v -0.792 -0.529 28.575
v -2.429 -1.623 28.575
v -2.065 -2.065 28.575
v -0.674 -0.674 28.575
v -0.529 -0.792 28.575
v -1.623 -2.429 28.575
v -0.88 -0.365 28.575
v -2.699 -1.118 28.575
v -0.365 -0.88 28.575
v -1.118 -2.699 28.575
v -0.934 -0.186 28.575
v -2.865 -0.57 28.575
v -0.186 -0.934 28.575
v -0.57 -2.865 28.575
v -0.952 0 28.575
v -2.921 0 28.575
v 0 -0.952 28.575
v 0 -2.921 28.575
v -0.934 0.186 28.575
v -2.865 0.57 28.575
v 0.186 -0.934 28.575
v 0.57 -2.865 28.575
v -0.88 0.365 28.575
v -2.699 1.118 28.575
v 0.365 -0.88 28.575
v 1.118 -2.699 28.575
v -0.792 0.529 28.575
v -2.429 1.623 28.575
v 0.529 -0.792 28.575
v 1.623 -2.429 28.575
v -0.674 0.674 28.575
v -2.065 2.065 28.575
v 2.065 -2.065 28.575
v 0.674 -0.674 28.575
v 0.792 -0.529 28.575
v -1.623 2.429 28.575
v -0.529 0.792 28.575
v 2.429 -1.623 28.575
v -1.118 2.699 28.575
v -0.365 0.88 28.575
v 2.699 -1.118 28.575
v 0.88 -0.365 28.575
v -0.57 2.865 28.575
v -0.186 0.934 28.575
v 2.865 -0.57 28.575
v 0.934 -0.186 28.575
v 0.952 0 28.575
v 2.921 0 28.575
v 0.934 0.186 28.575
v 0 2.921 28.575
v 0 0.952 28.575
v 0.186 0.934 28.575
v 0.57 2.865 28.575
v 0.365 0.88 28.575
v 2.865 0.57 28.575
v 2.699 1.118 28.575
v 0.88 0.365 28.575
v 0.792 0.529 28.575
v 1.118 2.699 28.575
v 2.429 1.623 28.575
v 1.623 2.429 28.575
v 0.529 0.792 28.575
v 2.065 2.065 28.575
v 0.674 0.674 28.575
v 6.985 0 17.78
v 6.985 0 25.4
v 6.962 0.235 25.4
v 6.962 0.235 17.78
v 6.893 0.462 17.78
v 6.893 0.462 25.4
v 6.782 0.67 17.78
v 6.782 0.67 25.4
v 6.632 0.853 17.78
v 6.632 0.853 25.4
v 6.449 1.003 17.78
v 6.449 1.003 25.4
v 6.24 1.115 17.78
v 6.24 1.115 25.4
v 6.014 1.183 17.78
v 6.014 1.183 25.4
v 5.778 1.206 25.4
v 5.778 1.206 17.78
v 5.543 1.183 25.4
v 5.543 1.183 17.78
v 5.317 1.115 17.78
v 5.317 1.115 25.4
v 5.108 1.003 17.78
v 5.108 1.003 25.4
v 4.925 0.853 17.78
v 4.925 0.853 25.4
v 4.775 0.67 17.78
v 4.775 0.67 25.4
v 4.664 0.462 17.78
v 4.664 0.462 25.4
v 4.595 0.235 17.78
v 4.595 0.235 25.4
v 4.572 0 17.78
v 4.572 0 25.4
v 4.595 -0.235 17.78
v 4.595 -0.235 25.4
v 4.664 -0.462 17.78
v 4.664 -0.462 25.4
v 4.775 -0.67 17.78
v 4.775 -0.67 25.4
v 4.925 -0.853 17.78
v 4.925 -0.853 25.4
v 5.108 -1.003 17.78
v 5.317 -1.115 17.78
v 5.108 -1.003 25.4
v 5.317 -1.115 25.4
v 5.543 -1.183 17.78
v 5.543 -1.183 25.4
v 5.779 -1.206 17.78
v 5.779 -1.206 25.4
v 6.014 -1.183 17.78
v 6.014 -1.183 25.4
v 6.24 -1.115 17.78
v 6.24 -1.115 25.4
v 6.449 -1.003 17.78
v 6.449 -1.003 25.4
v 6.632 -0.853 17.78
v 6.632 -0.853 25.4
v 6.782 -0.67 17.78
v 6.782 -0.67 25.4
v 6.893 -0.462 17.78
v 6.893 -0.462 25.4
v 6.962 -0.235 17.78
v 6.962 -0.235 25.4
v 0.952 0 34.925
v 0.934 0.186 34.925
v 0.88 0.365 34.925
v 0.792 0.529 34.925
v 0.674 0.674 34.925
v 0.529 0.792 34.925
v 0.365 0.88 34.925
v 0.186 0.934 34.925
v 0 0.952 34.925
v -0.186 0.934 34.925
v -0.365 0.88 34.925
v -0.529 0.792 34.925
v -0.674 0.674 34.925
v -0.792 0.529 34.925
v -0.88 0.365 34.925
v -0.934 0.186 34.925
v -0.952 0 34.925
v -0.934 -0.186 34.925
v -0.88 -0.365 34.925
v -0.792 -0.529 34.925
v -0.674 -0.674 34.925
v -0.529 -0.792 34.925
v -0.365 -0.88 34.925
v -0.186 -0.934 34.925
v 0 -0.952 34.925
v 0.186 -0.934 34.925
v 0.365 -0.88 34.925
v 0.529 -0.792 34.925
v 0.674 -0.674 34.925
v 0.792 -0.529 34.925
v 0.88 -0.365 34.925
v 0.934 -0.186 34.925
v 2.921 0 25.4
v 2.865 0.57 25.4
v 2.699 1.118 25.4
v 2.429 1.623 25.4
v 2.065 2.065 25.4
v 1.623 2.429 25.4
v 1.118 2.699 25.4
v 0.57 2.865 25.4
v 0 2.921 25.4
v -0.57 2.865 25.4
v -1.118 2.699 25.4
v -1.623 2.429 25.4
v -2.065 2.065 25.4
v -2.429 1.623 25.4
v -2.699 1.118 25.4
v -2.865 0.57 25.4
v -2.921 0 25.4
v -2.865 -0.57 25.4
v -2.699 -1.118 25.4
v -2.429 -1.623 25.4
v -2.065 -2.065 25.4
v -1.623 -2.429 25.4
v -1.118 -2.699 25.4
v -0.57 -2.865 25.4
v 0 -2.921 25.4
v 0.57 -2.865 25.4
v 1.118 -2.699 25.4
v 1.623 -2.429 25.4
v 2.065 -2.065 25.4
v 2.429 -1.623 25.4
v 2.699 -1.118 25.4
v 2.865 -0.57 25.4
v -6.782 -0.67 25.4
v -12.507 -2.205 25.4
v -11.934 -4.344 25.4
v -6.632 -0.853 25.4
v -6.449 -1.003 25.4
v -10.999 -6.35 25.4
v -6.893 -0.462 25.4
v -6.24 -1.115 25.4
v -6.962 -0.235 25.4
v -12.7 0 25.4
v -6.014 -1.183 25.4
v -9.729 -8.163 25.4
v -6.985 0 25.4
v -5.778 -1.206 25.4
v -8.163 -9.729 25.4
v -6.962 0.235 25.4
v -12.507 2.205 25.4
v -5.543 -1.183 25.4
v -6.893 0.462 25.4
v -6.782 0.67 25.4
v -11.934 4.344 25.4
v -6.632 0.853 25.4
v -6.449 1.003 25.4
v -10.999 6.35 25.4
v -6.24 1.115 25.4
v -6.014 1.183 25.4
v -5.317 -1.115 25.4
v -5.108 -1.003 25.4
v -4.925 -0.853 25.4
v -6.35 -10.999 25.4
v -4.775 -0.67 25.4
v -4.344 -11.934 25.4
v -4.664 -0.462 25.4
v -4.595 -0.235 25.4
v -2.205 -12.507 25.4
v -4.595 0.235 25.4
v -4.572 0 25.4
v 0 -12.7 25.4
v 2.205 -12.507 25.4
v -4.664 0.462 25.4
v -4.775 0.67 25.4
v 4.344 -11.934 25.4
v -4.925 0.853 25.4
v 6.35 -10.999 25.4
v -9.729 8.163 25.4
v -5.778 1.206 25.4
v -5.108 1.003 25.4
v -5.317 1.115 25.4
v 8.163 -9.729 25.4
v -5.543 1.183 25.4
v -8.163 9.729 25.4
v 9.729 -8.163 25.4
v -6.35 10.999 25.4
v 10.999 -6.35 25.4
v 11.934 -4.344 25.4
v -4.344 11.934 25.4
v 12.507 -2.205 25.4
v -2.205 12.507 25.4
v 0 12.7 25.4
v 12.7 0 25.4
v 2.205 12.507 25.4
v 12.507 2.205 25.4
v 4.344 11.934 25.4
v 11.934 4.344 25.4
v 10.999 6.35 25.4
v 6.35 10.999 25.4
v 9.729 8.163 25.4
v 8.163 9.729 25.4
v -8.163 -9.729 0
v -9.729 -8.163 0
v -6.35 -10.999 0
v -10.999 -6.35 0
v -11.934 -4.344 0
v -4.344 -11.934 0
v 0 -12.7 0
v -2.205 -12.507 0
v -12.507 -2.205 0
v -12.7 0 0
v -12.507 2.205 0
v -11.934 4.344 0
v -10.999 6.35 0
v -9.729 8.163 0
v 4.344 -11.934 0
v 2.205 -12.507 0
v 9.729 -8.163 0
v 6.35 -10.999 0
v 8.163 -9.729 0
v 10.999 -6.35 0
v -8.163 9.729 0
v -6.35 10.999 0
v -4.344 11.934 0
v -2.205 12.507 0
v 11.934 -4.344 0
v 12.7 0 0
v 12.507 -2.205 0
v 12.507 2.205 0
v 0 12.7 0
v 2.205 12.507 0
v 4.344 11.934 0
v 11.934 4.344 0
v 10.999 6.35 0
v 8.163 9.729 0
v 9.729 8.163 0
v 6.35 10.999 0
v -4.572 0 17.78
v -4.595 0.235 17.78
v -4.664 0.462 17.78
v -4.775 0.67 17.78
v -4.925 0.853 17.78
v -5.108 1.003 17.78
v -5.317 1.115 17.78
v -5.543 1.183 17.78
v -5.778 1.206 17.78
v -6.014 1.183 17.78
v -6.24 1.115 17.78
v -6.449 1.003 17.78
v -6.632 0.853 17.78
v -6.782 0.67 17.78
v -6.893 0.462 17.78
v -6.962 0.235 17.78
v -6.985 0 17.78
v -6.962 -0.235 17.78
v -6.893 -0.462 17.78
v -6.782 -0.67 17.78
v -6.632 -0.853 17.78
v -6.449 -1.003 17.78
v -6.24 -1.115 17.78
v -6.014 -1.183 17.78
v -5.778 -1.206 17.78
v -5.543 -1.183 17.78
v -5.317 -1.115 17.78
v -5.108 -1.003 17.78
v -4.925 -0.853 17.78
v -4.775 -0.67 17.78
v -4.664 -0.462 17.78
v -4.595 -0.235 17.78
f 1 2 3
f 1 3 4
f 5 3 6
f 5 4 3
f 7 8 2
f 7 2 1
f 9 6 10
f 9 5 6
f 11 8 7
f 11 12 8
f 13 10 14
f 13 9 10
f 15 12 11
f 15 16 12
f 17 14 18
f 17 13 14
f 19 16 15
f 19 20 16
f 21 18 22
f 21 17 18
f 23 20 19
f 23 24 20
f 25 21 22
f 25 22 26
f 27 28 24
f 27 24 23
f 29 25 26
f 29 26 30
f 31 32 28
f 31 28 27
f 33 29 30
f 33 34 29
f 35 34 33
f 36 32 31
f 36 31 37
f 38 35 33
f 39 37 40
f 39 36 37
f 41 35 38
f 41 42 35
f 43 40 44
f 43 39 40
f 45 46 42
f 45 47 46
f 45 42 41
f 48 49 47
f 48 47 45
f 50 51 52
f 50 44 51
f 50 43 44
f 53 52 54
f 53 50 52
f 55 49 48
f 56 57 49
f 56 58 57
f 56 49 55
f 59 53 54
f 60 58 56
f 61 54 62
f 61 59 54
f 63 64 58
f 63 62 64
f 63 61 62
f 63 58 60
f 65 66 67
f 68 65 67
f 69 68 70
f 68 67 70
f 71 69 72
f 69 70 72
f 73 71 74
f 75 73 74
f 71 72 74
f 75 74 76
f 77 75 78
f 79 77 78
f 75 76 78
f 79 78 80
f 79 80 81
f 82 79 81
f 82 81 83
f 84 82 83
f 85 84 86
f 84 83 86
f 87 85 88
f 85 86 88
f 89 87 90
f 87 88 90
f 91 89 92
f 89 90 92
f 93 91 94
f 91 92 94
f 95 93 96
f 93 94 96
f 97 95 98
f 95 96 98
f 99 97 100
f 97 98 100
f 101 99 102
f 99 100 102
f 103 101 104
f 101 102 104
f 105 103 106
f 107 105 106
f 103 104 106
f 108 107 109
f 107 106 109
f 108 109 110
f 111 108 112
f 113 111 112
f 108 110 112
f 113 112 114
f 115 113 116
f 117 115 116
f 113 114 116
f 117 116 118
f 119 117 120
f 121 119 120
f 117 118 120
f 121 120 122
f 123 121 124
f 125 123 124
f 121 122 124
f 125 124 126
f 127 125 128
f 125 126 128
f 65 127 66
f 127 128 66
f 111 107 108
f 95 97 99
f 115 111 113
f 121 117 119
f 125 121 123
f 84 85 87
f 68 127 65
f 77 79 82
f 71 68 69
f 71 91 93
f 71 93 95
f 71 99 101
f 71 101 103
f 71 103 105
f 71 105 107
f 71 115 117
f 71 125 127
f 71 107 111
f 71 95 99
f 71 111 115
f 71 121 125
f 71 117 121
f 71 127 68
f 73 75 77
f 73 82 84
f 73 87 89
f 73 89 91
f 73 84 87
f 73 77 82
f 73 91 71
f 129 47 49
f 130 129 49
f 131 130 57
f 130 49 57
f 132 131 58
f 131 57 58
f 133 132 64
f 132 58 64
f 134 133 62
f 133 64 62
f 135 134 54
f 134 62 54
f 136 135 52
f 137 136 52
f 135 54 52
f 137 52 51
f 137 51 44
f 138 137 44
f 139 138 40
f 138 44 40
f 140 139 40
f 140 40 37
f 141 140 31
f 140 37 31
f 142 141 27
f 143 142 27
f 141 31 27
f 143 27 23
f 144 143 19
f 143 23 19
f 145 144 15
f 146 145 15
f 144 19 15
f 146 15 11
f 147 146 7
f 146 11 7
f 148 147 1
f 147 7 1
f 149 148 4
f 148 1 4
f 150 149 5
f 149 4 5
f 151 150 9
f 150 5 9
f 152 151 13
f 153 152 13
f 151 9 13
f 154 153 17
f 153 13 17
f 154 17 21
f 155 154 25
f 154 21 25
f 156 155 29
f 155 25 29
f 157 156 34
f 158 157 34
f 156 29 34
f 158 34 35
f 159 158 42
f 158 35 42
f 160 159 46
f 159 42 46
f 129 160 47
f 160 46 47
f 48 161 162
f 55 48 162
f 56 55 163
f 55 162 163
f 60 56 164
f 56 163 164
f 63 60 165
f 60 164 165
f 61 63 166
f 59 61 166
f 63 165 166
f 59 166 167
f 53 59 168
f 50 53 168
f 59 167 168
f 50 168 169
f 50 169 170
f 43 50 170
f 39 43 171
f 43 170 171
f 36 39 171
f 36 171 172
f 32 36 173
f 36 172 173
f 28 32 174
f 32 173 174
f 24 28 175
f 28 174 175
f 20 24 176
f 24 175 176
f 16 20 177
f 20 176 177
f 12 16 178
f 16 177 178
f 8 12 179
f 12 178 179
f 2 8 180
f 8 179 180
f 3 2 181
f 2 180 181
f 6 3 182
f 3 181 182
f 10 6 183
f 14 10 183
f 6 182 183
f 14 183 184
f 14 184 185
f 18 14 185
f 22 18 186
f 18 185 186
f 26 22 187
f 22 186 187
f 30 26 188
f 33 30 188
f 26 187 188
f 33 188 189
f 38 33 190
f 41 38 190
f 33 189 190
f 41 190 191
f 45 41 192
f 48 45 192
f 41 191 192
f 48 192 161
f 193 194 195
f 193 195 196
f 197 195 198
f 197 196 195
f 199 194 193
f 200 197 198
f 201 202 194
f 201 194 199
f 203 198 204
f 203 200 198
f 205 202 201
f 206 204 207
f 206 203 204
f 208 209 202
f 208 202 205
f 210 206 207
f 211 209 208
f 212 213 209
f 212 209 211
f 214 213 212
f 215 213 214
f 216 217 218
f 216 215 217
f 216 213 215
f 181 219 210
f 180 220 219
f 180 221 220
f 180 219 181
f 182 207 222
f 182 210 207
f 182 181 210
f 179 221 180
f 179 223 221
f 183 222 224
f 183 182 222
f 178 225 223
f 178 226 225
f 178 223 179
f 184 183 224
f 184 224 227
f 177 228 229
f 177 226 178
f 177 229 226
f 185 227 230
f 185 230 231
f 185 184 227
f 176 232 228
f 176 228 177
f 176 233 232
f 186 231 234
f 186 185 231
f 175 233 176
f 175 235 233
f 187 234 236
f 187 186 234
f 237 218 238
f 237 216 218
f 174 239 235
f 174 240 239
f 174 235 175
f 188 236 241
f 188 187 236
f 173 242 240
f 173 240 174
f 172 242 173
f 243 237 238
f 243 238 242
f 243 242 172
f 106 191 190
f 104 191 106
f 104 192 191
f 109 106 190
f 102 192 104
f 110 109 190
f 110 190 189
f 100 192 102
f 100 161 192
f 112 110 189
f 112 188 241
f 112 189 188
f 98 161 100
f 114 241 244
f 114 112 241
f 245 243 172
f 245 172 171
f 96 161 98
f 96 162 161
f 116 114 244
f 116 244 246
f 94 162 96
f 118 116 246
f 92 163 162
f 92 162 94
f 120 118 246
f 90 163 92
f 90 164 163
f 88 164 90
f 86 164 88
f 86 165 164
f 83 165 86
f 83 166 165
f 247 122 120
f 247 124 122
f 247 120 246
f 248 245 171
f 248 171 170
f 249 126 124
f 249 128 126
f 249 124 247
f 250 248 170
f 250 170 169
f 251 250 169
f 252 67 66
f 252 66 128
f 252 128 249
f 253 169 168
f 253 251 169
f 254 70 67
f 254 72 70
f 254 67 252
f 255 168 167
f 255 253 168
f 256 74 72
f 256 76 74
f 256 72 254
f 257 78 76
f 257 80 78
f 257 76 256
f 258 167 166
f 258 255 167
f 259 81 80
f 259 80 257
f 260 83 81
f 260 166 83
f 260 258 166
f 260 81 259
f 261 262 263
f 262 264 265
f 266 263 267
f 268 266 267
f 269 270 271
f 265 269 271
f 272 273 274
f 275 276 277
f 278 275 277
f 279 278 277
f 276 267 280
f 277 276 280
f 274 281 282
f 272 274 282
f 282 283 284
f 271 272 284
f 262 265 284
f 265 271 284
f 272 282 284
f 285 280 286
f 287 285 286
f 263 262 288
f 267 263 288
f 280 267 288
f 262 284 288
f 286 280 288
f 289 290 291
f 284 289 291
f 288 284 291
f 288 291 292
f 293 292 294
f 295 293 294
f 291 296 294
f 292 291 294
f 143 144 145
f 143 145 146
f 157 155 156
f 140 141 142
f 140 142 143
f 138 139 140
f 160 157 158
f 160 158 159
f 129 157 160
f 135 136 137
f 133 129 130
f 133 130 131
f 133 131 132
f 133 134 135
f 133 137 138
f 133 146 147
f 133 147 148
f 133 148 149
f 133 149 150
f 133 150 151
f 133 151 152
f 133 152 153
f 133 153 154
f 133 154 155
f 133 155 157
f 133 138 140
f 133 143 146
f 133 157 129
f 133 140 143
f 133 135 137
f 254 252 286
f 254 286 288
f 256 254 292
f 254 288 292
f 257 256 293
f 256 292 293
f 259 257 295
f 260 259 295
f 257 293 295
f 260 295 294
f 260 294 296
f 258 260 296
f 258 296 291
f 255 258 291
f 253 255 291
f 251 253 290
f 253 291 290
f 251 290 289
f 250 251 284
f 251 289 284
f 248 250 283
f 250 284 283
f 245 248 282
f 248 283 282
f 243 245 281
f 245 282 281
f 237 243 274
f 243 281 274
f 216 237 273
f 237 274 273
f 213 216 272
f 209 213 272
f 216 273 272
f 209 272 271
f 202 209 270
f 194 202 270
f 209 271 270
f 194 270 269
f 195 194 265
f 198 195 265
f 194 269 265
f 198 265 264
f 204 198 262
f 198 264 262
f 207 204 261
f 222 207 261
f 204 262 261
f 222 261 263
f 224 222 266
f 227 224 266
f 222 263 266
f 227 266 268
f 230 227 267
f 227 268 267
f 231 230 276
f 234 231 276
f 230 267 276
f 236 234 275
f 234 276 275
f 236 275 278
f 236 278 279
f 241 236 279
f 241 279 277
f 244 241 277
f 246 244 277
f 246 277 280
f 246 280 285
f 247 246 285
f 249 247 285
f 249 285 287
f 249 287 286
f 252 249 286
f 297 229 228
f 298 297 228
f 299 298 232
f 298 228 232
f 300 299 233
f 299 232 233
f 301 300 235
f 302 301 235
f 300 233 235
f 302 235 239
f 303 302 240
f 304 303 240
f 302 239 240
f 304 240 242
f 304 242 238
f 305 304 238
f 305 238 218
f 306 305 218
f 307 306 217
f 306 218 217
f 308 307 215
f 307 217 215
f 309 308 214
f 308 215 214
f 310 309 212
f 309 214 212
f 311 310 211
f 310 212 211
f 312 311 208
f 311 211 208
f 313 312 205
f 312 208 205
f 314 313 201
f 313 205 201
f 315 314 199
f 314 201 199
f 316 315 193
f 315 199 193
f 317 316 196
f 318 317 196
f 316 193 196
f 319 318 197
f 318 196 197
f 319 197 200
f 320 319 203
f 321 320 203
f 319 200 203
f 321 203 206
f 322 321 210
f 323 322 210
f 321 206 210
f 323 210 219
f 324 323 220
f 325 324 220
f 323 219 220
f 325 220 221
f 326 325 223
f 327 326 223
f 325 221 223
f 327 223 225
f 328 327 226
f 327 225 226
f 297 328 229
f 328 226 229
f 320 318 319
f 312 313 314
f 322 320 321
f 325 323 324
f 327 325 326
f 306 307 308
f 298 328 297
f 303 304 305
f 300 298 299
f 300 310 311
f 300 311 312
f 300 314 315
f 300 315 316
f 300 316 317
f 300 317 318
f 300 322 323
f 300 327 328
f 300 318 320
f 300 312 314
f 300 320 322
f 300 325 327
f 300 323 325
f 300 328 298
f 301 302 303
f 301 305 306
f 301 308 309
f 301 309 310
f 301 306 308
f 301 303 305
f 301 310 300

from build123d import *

# Parameters (mm, degrees)
SKETCH1_R           = 12.7
BOSS_EXTRUDE1_DEPTH = 25.4
SKETCH2_R           = 2.921
BOSS_EXTRUDE2_DEPTH = 3.175
SKETCH4_R           = 1.2065
CUT_EXTRUDE1_DEPTH  = 7.62
SKETCH6_R           = 0.9525
BOSS_EXTRUDE3_DEPTH = 6.35


with BuildPart() as part:
    # Sketch1 → Boss-Extrude1 (new body)
    with BuildSketch(Plane.XY):
        Circle(SKETCH1_R)
    extrude(amount=BOSS_EXTRUDE1_DEPTH)

    # Sketch2 → Boss-Extrude2 (add)
    with BuildSketch(Plane.XY.offset(25.4)):
        Circle(SKETCH2_R)
    extrude(amount=BOSS_EXTRUDE2_DEPTH)

    # Sketch4 → Cut-Extrude1 (cut)
    with BuildSketch(Plane.XY.offset(25.4)):
        with Locations((-5.7785, 0)):
            Circle(SKETCH4_R)
        with Locations((5.7785, 0)):
            Circle(SKETCH4_R)
    extrude(amount=-CUT_EXTRUDE1_DEPTH, mode=Mode.SUBTRACT)

    # Sketch6 → Boss-Extrude3 (add)
    with BuildSketch(Plane.XY.offset(28.575)):
        Circle(SKETCH6_R)
    extrude(amount=BOSS_EXTRUDE3_DEPTH)


solid = part.part
